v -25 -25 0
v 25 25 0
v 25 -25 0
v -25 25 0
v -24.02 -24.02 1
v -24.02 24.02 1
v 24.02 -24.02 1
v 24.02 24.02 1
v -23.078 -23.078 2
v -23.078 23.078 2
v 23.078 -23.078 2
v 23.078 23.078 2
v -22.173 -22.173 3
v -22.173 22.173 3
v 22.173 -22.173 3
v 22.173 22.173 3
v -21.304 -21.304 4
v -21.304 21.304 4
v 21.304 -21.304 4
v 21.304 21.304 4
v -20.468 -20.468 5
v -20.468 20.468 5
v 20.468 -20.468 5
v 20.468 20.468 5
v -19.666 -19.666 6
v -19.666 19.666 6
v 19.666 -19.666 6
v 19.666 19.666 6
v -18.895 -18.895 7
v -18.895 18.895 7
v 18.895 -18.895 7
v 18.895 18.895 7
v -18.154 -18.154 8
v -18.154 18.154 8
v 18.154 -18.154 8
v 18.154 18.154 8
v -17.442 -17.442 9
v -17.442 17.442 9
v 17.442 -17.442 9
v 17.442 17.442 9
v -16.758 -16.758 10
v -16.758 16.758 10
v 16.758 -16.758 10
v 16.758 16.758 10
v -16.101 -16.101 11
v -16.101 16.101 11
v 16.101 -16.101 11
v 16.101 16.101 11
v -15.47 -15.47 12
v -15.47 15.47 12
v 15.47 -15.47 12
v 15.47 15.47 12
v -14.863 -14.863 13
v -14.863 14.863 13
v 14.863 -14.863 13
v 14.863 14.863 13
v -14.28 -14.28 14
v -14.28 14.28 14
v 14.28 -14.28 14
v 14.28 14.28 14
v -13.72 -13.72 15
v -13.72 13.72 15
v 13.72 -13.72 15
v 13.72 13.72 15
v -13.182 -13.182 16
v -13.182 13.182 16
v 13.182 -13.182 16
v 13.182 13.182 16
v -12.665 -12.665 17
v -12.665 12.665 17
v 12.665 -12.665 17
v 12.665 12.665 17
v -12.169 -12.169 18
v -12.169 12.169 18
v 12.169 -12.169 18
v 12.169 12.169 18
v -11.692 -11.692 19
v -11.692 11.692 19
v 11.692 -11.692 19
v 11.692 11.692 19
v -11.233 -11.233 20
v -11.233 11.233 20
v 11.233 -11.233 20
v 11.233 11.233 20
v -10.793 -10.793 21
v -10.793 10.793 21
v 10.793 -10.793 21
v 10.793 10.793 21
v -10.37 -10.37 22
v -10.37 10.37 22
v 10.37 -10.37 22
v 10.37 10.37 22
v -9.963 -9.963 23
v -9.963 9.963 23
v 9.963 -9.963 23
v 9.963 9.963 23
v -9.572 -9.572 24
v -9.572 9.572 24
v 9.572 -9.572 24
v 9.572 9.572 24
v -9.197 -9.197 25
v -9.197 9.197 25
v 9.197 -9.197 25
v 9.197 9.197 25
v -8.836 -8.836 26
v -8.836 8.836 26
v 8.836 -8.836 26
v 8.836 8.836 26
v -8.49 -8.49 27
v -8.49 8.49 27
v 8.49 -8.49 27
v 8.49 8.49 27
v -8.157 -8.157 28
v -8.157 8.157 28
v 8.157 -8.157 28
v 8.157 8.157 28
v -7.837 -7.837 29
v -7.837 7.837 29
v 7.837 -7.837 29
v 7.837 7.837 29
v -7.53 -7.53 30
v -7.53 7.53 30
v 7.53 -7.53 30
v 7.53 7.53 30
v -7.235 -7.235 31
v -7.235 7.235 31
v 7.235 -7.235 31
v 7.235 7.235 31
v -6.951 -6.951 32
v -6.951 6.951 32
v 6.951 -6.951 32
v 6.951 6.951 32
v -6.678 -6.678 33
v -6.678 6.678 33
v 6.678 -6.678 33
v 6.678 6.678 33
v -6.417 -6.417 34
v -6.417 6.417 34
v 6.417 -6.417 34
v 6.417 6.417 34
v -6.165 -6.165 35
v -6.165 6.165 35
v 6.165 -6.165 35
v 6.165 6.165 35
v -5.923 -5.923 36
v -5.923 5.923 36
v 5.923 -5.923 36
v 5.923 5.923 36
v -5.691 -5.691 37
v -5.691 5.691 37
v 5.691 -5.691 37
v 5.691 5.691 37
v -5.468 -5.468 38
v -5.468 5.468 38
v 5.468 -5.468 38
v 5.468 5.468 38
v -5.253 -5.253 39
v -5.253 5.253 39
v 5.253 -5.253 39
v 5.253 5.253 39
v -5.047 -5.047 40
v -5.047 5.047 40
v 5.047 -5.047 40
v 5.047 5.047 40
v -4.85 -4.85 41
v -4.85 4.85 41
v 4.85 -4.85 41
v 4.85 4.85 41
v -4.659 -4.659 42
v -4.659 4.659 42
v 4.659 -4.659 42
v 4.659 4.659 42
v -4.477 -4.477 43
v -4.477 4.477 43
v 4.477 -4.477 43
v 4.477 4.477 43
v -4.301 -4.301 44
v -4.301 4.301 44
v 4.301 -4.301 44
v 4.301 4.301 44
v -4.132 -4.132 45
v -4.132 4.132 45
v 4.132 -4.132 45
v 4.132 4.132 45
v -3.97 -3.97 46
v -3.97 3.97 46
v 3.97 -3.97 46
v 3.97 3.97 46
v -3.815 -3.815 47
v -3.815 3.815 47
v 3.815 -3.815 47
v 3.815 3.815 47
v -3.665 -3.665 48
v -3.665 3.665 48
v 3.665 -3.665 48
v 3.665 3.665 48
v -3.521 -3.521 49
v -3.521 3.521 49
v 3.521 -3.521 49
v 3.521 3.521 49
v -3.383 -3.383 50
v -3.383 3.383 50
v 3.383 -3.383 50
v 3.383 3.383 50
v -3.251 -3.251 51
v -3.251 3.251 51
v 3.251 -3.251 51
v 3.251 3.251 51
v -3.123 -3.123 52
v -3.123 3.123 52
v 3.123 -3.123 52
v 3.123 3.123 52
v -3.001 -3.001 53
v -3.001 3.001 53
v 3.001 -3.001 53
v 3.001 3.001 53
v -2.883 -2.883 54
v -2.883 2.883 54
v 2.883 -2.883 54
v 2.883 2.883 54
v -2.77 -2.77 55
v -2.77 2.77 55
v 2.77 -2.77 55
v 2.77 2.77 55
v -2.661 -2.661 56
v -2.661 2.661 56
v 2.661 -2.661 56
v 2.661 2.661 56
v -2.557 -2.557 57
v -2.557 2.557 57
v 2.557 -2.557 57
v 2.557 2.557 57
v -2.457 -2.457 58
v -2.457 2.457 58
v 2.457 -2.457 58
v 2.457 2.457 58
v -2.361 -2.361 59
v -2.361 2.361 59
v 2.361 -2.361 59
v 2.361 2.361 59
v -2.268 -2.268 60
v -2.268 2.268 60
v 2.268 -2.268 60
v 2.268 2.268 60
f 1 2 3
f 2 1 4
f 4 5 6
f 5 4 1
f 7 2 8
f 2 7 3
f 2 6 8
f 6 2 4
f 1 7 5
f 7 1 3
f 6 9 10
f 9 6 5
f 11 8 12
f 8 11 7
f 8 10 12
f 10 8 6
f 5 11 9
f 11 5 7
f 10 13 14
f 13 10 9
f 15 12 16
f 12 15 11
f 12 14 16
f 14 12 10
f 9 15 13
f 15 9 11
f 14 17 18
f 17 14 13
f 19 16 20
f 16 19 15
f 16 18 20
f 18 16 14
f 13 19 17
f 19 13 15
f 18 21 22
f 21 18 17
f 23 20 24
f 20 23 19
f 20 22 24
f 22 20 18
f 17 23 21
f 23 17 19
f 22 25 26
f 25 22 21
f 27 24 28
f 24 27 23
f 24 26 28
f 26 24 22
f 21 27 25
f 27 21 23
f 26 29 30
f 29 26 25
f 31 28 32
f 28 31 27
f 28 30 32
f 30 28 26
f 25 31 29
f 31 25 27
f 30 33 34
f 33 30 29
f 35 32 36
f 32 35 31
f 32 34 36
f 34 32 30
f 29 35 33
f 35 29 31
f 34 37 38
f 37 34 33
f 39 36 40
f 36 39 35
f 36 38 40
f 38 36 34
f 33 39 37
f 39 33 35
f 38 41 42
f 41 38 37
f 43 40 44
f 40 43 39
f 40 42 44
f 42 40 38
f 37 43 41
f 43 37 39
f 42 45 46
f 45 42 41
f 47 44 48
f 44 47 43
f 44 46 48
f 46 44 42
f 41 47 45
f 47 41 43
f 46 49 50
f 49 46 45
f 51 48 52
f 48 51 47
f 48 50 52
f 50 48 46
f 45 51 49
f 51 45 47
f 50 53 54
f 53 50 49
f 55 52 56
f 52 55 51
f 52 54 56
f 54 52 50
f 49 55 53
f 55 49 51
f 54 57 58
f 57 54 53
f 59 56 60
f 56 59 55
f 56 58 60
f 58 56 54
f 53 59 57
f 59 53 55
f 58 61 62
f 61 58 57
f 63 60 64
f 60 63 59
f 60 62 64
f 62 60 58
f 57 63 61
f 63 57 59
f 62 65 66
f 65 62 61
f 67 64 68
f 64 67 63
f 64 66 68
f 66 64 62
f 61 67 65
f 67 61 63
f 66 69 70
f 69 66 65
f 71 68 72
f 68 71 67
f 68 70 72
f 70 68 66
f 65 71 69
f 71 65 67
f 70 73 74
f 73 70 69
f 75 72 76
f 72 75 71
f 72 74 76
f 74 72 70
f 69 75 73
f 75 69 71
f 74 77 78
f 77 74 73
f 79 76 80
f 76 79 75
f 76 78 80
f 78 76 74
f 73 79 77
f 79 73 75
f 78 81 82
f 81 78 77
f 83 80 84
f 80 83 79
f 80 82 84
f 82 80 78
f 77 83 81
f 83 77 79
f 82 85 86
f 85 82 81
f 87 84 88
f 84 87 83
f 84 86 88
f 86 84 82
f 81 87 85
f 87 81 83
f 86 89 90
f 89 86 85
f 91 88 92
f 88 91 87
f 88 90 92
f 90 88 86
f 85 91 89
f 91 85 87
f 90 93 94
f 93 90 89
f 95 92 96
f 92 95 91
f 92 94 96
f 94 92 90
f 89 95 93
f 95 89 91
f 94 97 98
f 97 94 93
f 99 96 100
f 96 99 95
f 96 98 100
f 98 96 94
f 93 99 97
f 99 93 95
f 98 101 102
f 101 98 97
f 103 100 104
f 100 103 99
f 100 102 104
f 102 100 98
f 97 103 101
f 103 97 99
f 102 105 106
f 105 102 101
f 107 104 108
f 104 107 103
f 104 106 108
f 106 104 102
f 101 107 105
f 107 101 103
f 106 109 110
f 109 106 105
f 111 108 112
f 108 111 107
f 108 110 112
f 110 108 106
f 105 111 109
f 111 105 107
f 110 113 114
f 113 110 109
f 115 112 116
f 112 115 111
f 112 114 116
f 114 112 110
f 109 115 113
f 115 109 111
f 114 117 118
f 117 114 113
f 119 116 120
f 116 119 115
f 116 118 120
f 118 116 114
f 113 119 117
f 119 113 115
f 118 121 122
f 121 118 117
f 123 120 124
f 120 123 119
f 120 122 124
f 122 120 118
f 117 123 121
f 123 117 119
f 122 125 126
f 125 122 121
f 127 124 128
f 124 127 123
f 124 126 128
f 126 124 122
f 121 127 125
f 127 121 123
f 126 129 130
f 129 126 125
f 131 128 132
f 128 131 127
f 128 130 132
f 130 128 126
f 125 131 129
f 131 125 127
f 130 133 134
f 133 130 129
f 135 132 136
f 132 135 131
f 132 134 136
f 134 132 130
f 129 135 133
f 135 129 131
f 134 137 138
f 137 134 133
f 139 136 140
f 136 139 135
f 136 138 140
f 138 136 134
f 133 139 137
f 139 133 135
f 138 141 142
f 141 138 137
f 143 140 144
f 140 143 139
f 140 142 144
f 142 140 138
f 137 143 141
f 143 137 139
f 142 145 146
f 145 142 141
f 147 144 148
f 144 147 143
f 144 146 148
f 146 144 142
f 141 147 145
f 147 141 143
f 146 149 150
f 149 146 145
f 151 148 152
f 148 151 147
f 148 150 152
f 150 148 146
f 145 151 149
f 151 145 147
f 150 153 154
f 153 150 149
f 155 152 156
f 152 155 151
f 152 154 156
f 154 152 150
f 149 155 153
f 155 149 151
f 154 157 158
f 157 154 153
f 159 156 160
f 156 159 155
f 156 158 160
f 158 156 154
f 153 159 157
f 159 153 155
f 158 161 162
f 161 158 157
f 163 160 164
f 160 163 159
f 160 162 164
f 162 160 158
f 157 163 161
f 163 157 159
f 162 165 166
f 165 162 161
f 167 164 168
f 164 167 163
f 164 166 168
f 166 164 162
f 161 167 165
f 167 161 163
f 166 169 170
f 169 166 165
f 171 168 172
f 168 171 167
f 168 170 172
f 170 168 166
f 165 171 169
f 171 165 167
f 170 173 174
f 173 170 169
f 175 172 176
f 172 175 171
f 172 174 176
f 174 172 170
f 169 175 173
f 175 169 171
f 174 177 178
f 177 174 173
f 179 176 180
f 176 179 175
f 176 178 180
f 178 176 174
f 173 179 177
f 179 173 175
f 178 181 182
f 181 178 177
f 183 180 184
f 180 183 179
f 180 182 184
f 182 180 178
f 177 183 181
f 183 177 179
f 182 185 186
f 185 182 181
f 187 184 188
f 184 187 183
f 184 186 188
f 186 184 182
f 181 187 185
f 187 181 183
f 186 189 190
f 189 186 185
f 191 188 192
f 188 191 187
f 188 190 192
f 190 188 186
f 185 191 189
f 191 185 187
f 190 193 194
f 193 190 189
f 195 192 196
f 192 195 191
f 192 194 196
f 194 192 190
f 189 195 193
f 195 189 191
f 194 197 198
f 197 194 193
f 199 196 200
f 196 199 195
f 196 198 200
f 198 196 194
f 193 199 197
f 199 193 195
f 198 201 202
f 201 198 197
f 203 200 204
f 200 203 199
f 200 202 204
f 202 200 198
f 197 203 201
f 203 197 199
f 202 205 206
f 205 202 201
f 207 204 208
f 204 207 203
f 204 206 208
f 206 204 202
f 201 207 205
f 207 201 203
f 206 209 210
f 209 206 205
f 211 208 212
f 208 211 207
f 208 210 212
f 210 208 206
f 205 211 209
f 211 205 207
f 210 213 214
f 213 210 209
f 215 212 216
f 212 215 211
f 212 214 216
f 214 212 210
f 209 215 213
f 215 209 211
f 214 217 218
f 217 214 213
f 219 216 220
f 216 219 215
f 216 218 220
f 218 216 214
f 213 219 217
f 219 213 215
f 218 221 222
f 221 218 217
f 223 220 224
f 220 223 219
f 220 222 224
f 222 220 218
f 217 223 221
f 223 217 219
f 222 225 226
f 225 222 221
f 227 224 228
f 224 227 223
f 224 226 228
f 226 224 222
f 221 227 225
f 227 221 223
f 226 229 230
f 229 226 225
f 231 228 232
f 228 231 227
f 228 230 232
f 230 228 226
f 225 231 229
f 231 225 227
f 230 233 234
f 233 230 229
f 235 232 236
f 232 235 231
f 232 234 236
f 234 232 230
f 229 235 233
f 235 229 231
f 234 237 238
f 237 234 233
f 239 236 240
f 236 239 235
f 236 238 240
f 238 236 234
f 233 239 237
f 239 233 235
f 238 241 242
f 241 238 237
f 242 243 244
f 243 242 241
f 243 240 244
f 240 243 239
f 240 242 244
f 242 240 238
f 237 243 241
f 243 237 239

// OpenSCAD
$fa = 1;
$fs = 0.4;

// --- Parameters ---
height = 60;
base_size = 50;
steps = 60;
decay_rate = 0.04;

module curved_square_solid() {
    step_h = height / steps;
    
    for (i = [0 : steps - 1]) {
        // Absolute scales for the bottom and top of this specific step
        scale_current = exp(-i * decay_rate);
        scale_next = exp(-(i + 1) * decay_rate);
        
        // Relative scale change for this specific extrusion
        step_scale = scale_next / scale_current;
        
        translate([0, 0, i * step_h])
            linear_extrude(height = step_h, scale = step_scale)
                square([base_size * scale_current, base_size * scale_current], center=true);
    }
}

curved_square_solid();
